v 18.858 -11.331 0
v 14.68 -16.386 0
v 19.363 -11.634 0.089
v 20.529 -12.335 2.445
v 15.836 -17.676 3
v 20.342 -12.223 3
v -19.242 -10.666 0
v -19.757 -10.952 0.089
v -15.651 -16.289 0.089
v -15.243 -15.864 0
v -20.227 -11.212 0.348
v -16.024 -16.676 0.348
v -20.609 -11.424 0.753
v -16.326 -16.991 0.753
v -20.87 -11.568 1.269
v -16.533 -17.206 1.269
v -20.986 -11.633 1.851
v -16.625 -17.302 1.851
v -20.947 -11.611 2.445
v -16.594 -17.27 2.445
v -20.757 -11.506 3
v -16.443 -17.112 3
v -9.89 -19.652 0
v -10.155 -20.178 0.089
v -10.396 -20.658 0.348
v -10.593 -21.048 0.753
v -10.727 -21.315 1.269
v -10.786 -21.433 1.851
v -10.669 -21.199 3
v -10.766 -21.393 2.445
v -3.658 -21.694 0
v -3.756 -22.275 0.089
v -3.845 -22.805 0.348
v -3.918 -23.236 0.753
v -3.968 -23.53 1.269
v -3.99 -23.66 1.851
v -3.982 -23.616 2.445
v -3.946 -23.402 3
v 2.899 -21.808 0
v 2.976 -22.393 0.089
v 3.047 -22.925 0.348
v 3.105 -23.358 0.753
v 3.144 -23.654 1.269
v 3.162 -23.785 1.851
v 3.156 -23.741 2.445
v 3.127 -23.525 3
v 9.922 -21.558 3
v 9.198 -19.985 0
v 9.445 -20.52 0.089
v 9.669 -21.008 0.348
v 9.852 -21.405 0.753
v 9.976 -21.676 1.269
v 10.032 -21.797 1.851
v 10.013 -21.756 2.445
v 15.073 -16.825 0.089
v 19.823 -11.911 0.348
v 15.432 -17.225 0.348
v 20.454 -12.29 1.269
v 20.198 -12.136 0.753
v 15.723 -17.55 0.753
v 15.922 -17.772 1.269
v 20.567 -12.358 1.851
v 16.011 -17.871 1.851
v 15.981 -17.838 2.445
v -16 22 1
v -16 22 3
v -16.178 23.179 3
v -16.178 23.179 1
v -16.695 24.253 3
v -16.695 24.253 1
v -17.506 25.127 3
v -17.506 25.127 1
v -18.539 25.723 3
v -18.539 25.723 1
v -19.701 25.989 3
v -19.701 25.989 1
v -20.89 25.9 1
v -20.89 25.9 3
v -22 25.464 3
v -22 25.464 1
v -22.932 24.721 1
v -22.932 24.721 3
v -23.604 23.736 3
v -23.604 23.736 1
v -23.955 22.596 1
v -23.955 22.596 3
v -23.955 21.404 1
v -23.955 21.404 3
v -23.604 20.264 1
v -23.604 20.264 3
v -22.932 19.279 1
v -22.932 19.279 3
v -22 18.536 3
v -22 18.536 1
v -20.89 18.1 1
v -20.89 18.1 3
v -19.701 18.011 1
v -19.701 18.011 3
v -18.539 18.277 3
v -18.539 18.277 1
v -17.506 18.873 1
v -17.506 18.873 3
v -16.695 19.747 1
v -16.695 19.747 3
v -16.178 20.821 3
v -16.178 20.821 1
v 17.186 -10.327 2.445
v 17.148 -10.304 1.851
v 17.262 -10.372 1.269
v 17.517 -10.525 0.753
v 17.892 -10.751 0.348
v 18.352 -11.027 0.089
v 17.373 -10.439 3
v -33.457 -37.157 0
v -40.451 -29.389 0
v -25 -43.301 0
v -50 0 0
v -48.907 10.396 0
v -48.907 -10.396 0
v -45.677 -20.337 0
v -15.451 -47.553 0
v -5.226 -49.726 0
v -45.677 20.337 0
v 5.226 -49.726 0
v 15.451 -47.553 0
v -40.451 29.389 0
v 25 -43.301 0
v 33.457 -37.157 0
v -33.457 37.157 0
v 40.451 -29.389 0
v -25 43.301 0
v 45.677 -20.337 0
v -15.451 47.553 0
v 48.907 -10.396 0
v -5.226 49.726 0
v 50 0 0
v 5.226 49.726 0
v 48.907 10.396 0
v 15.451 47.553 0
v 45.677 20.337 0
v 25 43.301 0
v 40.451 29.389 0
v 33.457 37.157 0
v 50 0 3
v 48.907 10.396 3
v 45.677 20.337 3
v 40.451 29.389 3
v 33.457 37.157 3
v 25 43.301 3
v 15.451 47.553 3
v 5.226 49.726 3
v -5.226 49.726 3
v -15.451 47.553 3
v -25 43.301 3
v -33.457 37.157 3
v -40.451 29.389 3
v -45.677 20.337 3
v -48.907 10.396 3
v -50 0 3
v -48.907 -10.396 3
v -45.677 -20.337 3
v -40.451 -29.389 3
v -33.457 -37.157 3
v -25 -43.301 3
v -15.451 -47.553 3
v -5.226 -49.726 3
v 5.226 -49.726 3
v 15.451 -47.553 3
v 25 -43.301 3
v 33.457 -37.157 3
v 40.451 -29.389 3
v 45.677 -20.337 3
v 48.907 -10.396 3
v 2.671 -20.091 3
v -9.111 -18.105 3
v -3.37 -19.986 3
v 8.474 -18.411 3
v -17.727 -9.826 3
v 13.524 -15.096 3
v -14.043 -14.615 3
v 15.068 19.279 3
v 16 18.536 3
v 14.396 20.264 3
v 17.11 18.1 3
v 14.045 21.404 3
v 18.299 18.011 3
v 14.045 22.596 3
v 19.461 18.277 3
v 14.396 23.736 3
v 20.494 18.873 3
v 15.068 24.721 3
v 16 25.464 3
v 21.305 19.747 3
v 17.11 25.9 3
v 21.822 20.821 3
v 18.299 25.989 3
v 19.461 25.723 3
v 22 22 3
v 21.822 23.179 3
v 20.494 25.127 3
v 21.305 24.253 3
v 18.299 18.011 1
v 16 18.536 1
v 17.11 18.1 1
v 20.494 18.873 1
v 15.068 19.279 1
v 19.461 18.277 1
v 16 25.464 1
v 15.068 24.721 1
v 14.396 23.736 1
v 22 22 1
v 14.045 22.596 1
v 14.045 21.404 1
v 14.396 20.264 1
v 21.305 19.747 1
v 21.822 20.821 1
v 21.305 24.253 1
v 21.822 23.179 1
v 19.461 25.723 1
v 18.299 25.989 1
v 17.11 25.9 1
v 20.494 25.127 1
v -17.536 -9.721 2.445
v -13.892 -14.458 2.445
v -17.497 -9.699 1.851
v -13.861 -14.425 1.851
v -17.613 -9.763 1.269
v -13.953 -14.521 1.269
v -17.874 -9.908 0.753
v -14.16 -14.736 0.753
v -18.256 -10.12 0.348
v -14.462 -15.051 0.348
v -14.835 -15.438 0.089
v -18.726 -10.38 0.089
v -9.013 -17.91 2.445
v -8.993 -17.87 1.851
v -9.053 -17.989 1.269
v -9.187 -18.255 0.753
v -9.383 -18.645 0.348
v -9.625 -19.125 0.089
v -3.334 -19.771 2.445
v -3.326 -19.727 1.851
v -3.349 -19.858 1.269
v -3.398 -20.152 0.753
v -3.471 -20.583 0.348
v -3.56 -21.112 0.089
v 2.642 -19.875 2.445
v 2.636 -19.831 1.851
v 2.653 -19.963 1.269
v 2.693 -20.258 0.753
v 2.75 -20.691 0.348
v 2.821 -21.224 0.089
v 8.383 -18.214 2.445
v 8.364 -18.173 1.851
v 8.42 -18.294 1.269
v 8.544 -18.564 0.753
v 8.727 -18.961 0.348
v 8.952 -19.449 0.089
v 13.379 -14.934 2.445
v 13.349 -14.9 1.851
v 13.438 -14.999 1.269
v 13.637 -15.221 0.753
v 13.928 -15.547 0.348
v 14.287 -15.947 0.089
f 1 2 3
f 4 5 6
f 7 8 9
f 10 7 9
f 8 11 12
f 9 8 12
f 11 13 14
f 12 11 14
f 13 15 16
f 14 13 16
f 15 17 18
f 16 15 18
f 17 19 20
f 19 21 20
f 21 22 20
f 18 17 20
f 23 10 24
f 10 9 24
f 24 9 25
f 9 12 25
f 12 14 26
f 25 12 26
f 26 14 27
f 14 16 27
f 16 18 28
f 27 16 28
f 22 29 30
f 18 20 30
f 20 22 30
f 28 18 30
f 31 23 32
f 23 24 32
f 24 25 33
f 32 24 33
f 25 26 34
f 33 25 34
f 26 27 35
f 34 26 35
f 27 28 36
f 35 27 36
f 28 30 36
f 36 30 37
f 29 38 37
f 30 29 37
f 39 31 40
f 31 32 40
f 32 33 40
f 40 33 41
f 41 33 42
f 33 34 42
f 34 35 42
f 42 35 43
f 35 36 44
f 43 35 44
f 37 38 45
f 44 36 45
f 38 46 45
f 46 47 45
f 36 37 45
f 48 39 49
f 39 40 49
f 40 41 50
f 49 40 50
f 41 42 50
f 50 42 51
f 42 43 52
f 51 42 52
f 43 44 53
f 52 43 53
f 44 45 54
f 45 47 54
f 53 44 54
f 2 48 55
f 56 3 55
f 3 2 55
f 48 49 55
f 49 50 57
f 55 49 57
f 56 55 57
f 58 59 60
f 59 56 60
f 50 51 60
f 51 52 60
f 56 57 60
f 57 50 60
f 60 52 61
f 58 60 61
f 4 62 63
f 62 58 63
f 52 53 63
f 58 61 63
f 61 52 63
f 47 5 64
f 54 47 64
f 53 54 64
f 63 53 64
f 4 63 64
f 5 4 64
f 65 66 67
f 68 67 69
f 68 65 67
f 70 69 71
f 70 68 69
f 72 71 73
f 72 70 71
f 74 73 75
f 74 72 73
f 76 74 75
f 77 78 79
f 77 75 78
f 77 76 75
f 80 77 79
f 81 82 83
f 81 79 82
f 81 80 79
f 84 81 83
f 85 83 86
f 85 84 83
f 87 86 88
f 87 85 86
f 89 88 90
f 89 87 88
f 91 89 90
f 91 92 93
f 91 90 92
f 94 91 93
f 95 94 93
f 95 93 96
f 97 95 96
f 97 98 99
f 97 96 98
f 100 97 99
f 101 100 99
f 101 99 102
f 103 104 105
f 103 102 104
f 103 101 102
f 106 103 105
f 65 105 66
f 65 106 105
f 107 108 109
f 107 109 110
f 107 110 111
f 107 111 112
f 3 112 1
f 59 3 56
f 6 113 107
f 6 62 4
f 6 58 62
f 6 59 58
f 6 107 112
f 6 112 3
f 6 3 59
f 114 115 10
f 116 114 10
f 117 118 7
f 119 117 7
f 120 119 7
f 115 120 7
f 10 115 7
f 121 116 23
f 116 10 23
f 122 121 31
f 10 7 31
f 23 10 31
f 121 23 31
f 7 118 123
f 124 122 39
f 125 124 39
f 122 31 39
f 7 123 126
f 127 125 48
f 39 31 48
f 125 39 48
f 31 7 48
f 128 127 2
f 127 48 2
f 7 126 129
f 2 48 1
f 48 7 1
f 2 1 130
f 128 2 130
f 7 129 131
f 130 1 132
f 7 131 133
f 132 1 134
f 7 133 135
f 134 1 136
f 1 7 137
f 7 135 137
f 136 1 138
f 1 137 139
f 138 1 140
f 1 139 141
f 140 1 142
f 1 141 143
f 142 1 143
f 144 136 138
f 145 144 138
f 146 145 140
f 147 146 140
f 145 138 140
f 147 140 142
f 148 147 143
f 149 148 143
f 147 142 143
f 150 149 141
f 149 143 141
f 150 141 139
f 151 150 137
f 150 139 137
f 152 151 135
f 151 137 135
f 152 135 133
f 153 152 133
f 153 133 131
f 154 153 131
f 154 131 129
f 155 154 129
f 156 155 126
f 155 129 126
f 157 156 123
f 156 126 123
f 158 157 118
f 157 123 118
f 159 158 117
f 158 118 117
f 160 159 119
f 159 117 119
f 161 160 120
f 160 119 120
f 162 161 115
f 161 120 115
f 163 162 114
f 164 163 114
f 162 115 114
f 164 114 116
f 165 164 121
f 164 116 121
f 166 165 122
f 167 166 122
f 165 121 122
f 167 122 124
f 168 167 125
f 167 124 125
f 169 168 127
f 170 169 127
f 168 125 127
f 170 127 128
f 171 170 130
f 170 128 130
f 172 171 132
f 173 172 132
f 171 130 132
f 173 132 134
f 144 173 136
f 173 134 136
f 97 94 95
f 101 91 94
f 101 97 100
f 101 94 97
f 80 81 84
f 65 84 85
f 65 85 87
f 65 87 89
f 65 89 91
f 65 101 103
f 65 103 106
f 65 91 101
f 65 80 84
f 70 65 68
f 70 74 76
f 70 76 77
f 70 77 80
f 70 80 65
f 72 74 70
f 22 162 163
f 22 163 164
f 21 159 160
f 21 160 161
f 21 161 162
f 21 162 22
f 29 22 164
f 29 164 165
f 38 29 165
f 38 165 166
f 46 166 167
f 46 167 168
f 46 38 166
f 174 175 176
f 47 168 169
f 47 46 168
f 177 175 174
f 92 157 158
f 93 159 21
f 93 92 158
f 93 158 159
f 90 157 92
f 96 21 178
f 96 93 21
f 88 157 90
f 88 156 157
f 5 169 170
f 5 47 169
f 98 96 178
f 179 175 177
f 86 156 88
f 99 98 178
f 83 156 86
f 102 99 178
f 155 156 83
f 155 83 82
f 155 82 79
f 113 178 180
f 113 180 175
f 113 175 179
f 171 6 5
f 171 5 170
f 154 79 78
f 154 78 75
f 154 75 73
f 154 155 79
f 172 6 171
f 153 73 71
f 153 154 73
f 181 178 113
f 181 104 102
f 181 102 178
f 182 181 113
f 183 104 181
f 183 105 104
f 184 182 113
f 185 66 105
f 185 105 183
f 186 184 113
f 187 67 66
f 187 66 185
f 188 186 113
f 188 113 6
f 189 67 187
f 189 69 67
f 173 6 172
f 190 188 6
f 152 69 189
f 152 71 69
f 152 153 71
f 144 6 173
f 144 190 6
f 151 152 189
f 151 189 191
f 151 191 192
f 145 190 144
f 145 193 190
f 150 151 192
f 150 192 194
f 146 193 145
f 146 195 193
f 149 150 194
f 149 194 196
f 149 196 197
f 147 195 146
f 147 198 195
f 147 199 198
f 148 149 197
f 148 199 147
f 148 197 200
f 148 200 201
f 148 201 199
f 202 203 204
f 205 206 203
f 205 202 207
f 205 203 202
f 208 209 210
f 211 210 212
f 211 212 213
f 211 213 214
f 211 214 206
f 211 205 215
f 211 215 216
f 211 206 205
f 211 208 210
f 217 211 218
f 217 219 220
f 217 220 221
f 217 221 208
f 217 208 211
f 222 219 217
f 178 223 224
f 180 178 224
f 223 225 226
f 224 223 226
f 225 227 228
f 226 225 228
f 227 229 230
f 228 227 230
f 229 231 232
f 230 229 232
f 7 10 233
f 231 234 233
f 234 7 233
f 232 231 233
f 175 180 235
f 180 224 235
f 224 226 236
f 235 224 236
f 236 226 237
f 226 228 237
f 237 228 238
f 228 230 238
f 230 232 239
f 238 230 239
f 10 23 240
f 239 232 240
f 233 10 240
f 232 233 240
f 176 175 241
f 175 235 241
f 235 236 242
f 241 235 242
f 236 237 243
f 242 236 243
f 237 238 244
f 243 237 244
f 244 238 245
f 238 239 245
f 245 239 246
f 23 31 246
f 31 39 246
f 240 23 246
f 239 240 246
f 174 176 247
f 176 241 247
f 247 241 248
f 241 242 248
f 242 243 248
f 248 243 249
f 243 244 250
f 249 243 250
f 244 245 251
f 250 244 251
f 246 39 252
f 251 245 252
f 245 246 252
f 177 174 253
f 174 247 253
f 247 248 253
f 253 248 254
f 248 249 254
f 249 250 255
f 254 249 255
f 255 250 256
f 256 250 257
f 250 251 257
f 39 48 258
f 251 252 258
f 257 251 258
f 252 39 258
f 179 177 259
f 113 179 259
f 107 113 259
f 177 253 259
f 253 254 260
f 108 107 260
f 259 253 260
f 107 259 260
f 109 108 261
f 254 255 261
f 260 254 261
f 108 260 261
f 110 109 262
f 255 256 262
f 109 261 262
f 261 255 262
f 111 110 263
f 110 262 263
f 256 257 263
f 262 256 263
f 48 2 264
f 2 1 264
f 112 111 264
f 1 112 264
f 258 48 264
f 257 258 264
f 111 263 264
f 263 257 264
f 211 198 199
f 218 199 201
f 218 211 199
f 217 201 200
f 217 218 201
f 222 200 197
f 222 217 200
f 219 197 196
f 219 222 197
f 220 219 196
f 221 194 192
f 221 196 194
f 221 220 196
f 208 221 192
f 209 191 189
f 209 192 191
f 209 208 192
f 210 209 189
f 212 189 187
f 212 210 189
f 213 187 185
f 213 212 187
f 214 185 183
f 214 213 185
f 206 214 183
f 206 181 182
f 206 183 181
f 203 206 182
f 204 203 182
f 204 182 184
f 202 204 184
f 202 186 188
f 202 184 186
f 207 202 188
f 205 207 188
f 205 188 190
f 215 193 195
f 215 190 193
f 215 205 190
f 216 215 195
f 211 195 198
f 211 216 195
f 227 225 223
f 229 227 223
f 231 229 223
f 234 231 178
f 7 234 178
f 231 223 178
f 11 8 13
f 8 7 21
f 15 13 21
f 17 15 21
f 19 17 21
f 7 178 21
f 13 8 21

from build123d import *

# Parameters (mm, degrees)
TORUS_R               = 2
TORUS_ANGLE           = 120
TORUS_PLACEMENT_ANGLE = 209
CYLINDER002_R         = 4
CYLINDER002_DEPTH     = 10
CYLINDER001_R         = 4
CYLINDER001_DEPTH     = 10
CYLINDER_R            = 50
CYLINDER_DEPTH        = 3


with BuildPart() as torus:
    # Torus → Torus (revolve)
    with BuildSketch(Plane.XZ):
        with Locations((22, 0)):
            Circle(TORUS_R)
    revolve(axis=Axis((0, 0, 0), (0, 0, 1)), revolution_arc=TORUS_ANGLE)


with BuildPart() as torus_1:
    # Torus placement: moved
    add(torus.part.moved(Location((0, 0, 2))).rotate(Axis((0, 0, 2), (0, 0, 1)), TORUS_PLACEMENT_ANGLE))


with BuildPart() as cylinder001:
    # Cylinder002 → Cylinder002 (new body)
    with BuildSketch(Plane(origin=(18, 22, 1), x_dir=(1, 0, 0), z_dir=(0, 0, 1))):
        Circle(CYLINDER002_R)
    extrude(amount=CYLINDER002_DEPTH)


with BuildPart() as ojos_boca:
    # Cylinder001 → Cylinder001 (new body)
    with BuildSketch(Plane(origin=(-20, 22, 1), x_dir=(1, 0, 0), z_dir=(0, 0, 1))):
        Circle(CYLINDER001_R)
    extrude(amount=CYLINDER001_DEPTH)

    # Fusion: union Cylinder001
    add(cylinder001.part)

    # Fusion001: union Torus
    add(torus_1.part)


with BuildPart() as smiley:
    # Cylinder → Cylinder (new body)
    with BuildSketch(Plane.XY):
        Circle(CYLINDER_R)
    extrude(amount=CYLINDER_DEPTH)

    # Cut: cut Ojos_Boca
    add(ojos_boca.part, mode=Mode.SUBTRACT)


solid = smiley.part
